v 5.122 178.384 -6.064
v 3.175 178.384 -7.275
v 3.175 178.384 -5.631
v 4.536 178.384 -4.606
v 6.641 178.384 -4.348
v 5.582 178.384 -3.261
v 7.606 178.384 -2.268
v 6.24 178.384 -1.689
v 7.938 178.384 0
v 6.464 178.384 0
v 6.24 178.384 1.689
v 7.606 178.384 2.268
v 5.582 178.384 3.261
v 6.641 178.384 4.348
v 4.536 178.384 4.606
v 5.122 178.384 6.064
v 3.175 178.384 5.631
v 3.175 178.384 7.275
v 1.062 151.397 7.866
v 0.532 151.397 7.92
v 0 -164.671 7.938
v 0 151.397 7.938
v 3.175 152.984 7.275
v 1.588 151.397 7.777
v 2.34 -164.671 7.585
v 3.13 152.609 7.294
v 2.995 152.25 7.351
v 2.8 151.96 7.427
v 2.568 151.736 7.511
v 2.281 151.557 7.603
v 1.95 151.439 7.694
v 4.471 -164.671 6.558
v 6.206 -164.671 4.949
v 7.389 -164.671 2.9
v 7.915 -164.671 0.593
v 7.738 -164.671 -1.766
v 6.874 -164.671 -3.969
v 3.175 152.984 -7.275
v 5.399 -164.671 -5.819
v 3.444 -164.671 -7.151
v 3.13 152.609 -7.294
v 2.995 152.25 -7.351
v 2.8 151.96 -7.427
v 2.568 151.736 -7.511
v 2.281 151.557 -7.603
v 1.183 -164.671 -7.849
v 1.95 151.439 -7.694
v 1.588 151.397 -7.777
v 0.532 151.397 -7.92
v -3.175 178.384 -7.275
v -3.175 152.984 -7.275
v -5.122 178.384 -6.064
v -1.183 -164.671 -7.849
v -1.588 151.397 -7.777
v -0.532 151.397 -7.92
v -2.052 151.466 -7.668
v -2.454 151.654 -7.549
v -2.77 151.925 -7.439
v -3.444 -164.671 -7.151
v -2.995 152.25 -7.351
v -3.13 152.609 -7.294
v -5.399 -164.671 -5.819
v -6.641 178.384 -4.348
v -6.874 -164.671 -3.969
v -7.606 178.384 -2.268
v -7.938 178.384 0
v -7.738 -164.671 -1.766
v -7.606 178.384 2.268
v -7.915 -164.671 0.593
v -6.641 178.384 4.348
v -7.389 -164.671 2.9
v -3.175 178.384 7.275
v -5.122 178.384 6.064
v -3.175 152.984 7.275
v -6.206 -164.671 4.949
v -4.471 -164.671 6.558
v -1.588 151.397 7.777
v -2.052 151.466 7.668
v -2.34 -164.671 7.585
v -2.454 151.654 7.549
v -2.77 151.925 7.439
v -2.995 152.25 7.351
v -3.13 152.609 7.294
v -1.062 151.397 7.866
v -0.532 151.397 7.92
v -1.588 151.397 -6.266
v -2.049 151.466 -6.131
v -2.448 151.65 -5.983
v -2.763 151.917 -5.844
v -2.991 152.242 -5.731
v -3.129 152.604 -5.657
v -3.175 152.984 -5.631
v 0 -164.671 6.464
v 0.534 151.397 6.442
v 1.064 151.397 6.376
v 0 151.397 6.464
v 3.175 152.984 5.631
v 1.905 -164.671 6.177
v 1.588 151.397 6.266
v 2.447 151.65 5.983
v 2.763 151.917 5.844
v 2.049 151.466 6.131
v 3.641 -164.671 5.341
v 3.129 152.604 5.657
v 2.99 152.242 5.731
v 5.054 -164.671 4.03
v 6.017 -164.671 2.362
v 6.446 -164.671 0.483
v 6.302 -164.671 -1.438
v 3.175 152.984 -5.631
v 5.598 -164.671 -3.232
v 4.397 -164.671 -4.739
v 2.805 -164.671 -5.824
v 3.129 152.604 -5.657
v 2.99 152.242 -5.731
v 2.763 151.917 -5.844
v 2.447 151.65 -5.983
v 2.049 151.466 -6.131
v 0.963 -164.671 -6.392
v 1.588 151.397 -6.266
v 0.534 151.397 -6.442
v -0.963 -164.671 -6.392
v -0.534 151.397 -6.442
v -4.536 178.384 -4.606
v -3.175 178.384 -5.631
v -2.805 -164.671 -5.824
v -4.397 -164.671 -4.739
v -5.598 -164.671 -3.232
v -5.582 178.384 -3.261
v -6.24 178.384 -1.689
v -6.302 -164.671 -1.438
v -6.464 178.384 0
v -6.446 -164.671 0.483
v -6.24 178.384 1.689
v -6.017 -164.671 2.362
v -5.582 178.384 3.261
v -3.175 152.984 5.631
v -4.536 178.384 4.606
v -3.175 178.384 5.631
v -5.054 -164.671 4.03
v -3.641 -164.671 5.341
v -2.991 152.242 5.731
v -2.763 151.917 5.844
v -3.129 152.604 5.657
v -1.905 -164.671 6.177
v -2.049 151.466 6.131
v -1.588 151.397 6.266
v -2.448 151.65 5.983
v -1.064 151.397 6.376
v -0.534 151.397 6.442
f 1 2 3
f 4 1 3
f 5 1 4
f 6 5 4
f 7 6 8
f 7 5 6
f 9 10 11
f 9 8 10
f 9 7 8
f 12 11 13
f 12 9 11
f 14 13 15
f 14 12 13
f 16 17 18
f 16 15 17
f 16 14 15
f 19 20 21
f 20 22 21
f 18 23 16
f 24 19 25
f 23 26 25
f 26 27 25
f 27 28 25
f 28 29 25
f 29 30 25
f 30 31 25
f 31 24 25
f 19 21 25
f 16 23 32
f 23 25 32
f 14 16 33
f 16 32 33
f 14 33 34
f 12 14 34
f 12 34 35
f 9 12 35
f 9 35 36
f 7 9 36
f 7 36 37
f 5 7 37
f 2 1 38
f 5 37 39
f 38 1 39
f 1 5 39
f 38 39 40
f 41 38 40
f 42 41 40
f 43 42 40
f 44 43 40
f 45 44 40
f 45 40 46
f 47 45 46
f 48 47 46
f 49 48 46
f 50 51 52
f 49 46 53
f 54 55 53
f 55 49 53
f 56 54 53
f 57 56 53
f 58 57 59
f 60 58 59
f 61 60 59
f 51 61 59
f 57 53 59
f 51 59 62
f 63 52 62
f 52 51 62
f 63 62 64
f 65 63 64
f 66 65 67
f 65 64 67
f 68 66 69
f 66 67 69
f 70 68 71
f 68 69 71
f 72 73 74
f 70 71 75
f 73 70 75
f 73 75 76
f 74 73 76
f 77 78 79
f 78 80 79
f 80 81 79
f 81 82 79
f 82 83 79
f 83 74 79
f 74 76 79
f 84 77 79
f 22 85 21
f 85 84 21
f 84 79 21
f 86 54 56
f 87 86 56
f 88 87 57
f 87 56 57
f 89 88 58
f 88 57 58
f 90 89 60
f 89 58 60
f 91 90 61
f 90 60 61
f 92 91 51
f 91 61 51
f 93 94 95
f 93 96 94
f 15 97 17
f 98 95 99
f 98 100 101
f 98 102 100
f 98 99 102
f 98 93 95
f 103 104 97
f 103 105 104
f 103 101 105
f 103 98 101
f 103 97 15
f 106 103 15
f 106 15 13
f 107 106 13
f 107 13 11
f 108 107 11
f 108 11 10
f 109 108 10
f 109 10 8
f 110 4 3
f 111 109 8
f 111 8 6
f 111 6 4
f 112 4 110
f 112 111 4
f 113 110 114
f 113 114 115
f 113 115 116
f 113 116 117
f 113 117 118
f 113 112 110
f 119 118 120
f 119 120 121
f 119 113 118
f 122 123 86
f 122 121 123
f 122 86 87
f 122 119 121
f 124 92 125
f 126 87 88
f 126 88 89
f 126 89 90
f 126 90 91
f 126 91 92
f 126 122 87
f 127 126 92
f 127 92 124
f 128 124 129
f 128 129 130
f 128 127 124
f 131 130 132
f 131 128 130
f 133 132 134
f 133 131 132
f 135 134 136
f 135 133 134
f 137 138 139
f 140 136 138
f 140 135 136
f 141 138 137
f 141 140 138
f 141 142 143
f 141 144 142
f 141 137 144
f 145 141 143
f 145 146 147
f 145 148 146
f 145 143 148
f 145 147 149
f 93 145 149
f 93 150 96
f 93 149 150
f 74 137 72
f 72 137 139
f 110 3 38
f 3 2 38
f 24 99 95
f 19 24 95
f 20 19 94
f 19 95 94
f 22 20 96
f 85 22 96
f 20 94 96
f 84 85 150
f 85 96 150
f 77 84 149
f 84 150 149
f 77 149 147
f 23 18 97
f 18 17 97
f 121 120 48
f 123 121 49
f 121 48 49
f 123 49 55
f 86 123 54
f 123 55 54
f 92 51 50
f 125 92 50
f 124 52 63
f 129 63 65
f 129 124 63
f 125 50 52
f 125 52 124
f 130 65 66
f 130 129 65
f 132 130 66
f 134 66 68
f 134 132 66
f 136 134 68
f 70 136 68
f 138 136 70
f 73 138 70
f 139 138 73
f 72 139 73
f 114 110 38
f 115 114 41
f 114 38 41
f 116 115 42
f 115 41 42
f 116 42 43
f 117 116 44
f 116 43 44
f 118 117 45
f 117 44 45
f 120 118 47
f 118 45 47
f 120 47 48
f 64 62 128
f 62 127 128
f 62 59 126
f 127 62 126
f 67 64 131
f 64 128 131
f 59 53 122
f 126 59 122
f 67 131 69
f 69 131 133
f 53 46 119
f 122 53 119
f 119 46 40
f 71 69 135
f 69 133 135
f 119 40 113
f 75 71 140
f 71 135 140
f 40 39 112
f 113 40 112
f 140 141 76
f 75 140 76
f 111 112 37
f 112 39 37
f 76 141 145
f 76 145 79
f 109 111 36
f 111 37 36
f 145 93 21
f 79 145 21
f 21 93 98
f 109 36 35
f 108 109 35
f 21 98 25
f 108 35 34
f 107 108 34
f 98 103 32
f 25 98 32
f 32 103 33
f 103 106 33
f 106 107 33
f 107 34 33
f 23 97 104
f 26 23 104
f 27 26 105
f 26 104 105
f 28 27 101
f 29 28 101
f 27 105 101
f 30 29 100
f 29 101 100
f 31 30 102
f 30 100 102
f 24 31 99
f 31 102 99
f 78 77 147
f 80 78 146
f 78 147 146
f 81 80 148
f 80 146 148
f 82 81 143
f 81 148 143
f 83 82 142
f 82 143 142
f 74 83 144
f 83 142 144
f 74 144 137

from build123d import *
from OCP.BRepAlgoAPI import BRepAlgoAPI_Cut
from OCP.TopTools import TopTools_ListOfShape

# Parameters (mm, degrees)
BOSS_EXTRUDE1_START     = -164.670652
SKETCH1_R               = 7.9375
SKETCH1_R_2             = 6.4643
BOSS_EXTRUDE1_DEPTH     = 343.055109872
CUT_EXTRUDE1_DEPTH      = 179.737300592
CUT_EXTRUDE1_DEPTH_BACK = 179.737300592


with BuildPart() as part:
    # Sketch1 → Boss-Extrude1 (new body)
    with BuildSketch(Plane(origin=(0, 0, 0), x_dir=(1, 0, 0), z_dir=(0, 1, 0)).offset(BOSS_EXTRUDE1_START)):
        with Locations(Location((0, 0, 0), (0, 0, 270))):
            Circle(SKETCH1_R)
        with Locations(Location((0, 0, 0), (0, 0, 270))):
            Circle(SKETCH1_R_2, mode=Mode.SUBTRACT)
    extrude(amount=BOSS_EXTRUDE1_DEPTH)


with BuildPart() as cut_extrude1_tool:
    # Sketch2 → Cut-Extrude1 (new, two sides: drawn at the far end of the back side and taken through both)
    with BuildSketch(Plane.XY.offset(-CUT_EXTRUDE1_DEPTH_BACK)):
        with BuildLine():
            Line((-3.175, 178.384457539), (3.175, 178.384457539))
            Line((3.175, 178.384457539), (3.175, 152.984457539))
            ThreePointArc((3.175, 152.984457539), (2.710032015, 151.861925524), (1.5875, 151.396957539))
            Line((1.5875, 151.396957539), (-1.5875, 151.396957539))
            ThreePointArc((-1.5875, 151.396957539), (-2.710032015, 151.861925524), (-3.175, 152.984457539))
            Line((-3.175, 152.984457539), (-3.175, 178.384457539))
        make_face()
    extrude(amount=CUT_EXTRUDE1_DEPTH + CUT_EXTRUDE1_DEPTH_BACK)


with BuildPart() as part_1:
    add(part.part)

    # Cut-Extrude1: cut by cut_extrude1_tool, with a tolerance
    cut_extrude1_stock = TopTools_ListOfShape()
    cut_extrude1_stock.Append(part_1.part.wrapped)
    cut_extrude1_tools = TopTools_ListOfShape()
    cut_extrude1_tools.Append(cut_extrude1_tool.part.wrapped)
    cut_extrude1_cut = BRepAlgoAPI_Cut()
    cut_extrude1_cut.SetArguments(cut_extrude1_stock)
    cut_extrude1_cut.SetTools(cut_extrude1_tools)
    cut_extrude1_cut.SetFuzzyValue(0.00001)
    cut_extrude1_cut.Build()
    add(Compound.cast(cut_extrude1_cut.Shape()).solids(), mode=Mode.REPLACE)


solid = part_1.part
